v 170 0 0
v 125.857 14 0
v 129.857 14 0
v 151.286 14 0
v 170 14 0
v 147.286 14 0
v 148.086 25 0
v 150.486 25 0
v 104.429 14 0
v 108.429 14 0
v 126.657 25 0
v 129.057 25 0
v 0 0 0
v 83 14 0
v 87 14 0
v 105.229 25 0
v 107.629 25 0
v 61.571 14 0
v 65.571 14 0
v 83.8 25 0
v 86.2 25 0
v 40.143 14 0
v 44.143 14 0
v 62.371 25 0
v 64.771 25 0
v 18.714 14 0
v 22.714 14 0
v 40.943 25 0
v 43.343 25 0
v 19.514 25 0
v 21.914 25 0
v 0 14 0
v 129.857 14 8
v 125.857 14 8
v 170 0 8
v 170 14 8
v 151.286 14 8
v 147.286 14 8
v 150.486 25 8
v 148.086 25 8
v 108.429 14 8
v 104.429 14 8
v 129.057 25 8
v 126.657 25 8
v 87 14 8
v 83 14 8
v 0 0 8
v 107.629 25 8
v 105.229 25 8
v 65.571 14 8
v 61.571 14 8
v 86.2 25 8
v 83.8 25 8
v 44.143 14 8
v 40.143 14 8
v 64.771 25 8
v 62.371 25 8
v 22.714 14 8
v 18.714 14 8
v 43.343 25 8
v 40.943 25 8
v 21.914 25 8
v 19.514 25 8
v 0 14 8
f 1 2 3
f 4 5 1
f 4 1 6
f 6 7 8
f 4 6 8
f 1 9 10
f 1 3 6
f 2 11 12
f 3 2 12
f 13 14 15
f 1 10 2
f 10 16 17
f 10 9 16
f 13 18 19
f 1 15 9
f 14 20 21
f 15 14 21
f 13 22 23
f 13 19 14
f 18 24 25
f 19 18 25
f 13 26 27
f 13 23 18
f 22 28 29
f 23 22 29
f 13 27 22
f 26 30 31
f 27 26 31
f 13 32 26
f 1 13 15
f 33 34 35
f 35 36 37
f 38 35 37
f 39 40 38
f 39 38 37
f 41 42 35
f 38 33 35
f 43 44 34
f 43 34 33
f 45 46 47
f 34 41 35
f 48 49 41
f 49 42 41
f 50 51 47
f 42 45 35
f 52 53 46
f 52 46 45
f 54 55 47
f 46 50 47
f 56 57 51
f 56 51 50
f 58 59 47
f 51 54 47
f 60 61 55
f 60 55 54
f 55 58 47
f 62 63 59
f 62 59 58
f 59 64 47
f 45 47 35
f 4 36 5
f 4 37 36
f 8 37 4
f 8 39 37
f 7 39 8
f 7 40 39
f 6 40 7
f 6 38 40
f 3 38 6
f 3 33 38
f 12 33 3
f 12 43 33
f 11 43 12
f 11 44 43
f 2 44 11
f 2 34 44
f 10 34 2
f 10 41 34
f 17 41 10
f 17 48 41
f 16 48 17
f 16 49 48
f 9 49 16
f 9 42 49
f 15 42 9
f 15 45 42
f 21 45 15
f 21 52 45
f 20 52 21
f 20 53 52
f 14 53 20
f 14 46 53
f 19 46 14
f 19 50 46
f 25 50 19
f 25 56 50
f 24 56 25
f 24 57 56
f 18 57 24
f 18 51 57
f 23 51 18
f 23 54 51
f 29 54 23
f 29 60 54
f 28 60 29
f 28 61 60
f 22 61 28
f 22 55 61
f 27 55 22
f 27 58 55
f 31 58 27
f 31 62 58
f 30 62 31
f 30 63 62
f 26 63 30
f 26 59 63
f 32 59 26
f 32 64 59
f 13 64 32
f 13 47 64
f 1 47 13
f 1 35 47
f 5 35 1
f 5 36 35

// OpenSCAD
$fn = 32;

// ----------------------------------------------------------------------
// Gear rack: 7 teeth on a 170 mm bar, pitch 21.43 mm
// ----------------------------------------------------------------------

// --- parameters (mm) ---
profile_height = 8;       // extrusion height
profile_points = 32;      // points of the closed outline

profile = [[0, 0], [170, 0], [170, 14], [151.286, 14], [150.486, 25], [148.086, 25], [147.286, 14], [129.857, 14], [129.057, 25], [126.657, 25], [125.857, 14], [108.429, 14], [107.629, 25], [105.229, 25], [104.429, 14], [87, 14], [86.2, 25], [83.8, 25], [83, 14], [65.571, 14], [64.771, 25], [62.371, 25], [61.571, 14], [44.143, 14], [43.343, 25], [40.943, 25], [40.143, 14], [22.714, 14], [21.914, 25], [19.514, 25], [18.714, 14], [0, 14]];  // single closed polygon, 32 points, counter clockwise

// --- the one profile operation ---
linear_extrude(height = profile_height) polygon(points = profile);
